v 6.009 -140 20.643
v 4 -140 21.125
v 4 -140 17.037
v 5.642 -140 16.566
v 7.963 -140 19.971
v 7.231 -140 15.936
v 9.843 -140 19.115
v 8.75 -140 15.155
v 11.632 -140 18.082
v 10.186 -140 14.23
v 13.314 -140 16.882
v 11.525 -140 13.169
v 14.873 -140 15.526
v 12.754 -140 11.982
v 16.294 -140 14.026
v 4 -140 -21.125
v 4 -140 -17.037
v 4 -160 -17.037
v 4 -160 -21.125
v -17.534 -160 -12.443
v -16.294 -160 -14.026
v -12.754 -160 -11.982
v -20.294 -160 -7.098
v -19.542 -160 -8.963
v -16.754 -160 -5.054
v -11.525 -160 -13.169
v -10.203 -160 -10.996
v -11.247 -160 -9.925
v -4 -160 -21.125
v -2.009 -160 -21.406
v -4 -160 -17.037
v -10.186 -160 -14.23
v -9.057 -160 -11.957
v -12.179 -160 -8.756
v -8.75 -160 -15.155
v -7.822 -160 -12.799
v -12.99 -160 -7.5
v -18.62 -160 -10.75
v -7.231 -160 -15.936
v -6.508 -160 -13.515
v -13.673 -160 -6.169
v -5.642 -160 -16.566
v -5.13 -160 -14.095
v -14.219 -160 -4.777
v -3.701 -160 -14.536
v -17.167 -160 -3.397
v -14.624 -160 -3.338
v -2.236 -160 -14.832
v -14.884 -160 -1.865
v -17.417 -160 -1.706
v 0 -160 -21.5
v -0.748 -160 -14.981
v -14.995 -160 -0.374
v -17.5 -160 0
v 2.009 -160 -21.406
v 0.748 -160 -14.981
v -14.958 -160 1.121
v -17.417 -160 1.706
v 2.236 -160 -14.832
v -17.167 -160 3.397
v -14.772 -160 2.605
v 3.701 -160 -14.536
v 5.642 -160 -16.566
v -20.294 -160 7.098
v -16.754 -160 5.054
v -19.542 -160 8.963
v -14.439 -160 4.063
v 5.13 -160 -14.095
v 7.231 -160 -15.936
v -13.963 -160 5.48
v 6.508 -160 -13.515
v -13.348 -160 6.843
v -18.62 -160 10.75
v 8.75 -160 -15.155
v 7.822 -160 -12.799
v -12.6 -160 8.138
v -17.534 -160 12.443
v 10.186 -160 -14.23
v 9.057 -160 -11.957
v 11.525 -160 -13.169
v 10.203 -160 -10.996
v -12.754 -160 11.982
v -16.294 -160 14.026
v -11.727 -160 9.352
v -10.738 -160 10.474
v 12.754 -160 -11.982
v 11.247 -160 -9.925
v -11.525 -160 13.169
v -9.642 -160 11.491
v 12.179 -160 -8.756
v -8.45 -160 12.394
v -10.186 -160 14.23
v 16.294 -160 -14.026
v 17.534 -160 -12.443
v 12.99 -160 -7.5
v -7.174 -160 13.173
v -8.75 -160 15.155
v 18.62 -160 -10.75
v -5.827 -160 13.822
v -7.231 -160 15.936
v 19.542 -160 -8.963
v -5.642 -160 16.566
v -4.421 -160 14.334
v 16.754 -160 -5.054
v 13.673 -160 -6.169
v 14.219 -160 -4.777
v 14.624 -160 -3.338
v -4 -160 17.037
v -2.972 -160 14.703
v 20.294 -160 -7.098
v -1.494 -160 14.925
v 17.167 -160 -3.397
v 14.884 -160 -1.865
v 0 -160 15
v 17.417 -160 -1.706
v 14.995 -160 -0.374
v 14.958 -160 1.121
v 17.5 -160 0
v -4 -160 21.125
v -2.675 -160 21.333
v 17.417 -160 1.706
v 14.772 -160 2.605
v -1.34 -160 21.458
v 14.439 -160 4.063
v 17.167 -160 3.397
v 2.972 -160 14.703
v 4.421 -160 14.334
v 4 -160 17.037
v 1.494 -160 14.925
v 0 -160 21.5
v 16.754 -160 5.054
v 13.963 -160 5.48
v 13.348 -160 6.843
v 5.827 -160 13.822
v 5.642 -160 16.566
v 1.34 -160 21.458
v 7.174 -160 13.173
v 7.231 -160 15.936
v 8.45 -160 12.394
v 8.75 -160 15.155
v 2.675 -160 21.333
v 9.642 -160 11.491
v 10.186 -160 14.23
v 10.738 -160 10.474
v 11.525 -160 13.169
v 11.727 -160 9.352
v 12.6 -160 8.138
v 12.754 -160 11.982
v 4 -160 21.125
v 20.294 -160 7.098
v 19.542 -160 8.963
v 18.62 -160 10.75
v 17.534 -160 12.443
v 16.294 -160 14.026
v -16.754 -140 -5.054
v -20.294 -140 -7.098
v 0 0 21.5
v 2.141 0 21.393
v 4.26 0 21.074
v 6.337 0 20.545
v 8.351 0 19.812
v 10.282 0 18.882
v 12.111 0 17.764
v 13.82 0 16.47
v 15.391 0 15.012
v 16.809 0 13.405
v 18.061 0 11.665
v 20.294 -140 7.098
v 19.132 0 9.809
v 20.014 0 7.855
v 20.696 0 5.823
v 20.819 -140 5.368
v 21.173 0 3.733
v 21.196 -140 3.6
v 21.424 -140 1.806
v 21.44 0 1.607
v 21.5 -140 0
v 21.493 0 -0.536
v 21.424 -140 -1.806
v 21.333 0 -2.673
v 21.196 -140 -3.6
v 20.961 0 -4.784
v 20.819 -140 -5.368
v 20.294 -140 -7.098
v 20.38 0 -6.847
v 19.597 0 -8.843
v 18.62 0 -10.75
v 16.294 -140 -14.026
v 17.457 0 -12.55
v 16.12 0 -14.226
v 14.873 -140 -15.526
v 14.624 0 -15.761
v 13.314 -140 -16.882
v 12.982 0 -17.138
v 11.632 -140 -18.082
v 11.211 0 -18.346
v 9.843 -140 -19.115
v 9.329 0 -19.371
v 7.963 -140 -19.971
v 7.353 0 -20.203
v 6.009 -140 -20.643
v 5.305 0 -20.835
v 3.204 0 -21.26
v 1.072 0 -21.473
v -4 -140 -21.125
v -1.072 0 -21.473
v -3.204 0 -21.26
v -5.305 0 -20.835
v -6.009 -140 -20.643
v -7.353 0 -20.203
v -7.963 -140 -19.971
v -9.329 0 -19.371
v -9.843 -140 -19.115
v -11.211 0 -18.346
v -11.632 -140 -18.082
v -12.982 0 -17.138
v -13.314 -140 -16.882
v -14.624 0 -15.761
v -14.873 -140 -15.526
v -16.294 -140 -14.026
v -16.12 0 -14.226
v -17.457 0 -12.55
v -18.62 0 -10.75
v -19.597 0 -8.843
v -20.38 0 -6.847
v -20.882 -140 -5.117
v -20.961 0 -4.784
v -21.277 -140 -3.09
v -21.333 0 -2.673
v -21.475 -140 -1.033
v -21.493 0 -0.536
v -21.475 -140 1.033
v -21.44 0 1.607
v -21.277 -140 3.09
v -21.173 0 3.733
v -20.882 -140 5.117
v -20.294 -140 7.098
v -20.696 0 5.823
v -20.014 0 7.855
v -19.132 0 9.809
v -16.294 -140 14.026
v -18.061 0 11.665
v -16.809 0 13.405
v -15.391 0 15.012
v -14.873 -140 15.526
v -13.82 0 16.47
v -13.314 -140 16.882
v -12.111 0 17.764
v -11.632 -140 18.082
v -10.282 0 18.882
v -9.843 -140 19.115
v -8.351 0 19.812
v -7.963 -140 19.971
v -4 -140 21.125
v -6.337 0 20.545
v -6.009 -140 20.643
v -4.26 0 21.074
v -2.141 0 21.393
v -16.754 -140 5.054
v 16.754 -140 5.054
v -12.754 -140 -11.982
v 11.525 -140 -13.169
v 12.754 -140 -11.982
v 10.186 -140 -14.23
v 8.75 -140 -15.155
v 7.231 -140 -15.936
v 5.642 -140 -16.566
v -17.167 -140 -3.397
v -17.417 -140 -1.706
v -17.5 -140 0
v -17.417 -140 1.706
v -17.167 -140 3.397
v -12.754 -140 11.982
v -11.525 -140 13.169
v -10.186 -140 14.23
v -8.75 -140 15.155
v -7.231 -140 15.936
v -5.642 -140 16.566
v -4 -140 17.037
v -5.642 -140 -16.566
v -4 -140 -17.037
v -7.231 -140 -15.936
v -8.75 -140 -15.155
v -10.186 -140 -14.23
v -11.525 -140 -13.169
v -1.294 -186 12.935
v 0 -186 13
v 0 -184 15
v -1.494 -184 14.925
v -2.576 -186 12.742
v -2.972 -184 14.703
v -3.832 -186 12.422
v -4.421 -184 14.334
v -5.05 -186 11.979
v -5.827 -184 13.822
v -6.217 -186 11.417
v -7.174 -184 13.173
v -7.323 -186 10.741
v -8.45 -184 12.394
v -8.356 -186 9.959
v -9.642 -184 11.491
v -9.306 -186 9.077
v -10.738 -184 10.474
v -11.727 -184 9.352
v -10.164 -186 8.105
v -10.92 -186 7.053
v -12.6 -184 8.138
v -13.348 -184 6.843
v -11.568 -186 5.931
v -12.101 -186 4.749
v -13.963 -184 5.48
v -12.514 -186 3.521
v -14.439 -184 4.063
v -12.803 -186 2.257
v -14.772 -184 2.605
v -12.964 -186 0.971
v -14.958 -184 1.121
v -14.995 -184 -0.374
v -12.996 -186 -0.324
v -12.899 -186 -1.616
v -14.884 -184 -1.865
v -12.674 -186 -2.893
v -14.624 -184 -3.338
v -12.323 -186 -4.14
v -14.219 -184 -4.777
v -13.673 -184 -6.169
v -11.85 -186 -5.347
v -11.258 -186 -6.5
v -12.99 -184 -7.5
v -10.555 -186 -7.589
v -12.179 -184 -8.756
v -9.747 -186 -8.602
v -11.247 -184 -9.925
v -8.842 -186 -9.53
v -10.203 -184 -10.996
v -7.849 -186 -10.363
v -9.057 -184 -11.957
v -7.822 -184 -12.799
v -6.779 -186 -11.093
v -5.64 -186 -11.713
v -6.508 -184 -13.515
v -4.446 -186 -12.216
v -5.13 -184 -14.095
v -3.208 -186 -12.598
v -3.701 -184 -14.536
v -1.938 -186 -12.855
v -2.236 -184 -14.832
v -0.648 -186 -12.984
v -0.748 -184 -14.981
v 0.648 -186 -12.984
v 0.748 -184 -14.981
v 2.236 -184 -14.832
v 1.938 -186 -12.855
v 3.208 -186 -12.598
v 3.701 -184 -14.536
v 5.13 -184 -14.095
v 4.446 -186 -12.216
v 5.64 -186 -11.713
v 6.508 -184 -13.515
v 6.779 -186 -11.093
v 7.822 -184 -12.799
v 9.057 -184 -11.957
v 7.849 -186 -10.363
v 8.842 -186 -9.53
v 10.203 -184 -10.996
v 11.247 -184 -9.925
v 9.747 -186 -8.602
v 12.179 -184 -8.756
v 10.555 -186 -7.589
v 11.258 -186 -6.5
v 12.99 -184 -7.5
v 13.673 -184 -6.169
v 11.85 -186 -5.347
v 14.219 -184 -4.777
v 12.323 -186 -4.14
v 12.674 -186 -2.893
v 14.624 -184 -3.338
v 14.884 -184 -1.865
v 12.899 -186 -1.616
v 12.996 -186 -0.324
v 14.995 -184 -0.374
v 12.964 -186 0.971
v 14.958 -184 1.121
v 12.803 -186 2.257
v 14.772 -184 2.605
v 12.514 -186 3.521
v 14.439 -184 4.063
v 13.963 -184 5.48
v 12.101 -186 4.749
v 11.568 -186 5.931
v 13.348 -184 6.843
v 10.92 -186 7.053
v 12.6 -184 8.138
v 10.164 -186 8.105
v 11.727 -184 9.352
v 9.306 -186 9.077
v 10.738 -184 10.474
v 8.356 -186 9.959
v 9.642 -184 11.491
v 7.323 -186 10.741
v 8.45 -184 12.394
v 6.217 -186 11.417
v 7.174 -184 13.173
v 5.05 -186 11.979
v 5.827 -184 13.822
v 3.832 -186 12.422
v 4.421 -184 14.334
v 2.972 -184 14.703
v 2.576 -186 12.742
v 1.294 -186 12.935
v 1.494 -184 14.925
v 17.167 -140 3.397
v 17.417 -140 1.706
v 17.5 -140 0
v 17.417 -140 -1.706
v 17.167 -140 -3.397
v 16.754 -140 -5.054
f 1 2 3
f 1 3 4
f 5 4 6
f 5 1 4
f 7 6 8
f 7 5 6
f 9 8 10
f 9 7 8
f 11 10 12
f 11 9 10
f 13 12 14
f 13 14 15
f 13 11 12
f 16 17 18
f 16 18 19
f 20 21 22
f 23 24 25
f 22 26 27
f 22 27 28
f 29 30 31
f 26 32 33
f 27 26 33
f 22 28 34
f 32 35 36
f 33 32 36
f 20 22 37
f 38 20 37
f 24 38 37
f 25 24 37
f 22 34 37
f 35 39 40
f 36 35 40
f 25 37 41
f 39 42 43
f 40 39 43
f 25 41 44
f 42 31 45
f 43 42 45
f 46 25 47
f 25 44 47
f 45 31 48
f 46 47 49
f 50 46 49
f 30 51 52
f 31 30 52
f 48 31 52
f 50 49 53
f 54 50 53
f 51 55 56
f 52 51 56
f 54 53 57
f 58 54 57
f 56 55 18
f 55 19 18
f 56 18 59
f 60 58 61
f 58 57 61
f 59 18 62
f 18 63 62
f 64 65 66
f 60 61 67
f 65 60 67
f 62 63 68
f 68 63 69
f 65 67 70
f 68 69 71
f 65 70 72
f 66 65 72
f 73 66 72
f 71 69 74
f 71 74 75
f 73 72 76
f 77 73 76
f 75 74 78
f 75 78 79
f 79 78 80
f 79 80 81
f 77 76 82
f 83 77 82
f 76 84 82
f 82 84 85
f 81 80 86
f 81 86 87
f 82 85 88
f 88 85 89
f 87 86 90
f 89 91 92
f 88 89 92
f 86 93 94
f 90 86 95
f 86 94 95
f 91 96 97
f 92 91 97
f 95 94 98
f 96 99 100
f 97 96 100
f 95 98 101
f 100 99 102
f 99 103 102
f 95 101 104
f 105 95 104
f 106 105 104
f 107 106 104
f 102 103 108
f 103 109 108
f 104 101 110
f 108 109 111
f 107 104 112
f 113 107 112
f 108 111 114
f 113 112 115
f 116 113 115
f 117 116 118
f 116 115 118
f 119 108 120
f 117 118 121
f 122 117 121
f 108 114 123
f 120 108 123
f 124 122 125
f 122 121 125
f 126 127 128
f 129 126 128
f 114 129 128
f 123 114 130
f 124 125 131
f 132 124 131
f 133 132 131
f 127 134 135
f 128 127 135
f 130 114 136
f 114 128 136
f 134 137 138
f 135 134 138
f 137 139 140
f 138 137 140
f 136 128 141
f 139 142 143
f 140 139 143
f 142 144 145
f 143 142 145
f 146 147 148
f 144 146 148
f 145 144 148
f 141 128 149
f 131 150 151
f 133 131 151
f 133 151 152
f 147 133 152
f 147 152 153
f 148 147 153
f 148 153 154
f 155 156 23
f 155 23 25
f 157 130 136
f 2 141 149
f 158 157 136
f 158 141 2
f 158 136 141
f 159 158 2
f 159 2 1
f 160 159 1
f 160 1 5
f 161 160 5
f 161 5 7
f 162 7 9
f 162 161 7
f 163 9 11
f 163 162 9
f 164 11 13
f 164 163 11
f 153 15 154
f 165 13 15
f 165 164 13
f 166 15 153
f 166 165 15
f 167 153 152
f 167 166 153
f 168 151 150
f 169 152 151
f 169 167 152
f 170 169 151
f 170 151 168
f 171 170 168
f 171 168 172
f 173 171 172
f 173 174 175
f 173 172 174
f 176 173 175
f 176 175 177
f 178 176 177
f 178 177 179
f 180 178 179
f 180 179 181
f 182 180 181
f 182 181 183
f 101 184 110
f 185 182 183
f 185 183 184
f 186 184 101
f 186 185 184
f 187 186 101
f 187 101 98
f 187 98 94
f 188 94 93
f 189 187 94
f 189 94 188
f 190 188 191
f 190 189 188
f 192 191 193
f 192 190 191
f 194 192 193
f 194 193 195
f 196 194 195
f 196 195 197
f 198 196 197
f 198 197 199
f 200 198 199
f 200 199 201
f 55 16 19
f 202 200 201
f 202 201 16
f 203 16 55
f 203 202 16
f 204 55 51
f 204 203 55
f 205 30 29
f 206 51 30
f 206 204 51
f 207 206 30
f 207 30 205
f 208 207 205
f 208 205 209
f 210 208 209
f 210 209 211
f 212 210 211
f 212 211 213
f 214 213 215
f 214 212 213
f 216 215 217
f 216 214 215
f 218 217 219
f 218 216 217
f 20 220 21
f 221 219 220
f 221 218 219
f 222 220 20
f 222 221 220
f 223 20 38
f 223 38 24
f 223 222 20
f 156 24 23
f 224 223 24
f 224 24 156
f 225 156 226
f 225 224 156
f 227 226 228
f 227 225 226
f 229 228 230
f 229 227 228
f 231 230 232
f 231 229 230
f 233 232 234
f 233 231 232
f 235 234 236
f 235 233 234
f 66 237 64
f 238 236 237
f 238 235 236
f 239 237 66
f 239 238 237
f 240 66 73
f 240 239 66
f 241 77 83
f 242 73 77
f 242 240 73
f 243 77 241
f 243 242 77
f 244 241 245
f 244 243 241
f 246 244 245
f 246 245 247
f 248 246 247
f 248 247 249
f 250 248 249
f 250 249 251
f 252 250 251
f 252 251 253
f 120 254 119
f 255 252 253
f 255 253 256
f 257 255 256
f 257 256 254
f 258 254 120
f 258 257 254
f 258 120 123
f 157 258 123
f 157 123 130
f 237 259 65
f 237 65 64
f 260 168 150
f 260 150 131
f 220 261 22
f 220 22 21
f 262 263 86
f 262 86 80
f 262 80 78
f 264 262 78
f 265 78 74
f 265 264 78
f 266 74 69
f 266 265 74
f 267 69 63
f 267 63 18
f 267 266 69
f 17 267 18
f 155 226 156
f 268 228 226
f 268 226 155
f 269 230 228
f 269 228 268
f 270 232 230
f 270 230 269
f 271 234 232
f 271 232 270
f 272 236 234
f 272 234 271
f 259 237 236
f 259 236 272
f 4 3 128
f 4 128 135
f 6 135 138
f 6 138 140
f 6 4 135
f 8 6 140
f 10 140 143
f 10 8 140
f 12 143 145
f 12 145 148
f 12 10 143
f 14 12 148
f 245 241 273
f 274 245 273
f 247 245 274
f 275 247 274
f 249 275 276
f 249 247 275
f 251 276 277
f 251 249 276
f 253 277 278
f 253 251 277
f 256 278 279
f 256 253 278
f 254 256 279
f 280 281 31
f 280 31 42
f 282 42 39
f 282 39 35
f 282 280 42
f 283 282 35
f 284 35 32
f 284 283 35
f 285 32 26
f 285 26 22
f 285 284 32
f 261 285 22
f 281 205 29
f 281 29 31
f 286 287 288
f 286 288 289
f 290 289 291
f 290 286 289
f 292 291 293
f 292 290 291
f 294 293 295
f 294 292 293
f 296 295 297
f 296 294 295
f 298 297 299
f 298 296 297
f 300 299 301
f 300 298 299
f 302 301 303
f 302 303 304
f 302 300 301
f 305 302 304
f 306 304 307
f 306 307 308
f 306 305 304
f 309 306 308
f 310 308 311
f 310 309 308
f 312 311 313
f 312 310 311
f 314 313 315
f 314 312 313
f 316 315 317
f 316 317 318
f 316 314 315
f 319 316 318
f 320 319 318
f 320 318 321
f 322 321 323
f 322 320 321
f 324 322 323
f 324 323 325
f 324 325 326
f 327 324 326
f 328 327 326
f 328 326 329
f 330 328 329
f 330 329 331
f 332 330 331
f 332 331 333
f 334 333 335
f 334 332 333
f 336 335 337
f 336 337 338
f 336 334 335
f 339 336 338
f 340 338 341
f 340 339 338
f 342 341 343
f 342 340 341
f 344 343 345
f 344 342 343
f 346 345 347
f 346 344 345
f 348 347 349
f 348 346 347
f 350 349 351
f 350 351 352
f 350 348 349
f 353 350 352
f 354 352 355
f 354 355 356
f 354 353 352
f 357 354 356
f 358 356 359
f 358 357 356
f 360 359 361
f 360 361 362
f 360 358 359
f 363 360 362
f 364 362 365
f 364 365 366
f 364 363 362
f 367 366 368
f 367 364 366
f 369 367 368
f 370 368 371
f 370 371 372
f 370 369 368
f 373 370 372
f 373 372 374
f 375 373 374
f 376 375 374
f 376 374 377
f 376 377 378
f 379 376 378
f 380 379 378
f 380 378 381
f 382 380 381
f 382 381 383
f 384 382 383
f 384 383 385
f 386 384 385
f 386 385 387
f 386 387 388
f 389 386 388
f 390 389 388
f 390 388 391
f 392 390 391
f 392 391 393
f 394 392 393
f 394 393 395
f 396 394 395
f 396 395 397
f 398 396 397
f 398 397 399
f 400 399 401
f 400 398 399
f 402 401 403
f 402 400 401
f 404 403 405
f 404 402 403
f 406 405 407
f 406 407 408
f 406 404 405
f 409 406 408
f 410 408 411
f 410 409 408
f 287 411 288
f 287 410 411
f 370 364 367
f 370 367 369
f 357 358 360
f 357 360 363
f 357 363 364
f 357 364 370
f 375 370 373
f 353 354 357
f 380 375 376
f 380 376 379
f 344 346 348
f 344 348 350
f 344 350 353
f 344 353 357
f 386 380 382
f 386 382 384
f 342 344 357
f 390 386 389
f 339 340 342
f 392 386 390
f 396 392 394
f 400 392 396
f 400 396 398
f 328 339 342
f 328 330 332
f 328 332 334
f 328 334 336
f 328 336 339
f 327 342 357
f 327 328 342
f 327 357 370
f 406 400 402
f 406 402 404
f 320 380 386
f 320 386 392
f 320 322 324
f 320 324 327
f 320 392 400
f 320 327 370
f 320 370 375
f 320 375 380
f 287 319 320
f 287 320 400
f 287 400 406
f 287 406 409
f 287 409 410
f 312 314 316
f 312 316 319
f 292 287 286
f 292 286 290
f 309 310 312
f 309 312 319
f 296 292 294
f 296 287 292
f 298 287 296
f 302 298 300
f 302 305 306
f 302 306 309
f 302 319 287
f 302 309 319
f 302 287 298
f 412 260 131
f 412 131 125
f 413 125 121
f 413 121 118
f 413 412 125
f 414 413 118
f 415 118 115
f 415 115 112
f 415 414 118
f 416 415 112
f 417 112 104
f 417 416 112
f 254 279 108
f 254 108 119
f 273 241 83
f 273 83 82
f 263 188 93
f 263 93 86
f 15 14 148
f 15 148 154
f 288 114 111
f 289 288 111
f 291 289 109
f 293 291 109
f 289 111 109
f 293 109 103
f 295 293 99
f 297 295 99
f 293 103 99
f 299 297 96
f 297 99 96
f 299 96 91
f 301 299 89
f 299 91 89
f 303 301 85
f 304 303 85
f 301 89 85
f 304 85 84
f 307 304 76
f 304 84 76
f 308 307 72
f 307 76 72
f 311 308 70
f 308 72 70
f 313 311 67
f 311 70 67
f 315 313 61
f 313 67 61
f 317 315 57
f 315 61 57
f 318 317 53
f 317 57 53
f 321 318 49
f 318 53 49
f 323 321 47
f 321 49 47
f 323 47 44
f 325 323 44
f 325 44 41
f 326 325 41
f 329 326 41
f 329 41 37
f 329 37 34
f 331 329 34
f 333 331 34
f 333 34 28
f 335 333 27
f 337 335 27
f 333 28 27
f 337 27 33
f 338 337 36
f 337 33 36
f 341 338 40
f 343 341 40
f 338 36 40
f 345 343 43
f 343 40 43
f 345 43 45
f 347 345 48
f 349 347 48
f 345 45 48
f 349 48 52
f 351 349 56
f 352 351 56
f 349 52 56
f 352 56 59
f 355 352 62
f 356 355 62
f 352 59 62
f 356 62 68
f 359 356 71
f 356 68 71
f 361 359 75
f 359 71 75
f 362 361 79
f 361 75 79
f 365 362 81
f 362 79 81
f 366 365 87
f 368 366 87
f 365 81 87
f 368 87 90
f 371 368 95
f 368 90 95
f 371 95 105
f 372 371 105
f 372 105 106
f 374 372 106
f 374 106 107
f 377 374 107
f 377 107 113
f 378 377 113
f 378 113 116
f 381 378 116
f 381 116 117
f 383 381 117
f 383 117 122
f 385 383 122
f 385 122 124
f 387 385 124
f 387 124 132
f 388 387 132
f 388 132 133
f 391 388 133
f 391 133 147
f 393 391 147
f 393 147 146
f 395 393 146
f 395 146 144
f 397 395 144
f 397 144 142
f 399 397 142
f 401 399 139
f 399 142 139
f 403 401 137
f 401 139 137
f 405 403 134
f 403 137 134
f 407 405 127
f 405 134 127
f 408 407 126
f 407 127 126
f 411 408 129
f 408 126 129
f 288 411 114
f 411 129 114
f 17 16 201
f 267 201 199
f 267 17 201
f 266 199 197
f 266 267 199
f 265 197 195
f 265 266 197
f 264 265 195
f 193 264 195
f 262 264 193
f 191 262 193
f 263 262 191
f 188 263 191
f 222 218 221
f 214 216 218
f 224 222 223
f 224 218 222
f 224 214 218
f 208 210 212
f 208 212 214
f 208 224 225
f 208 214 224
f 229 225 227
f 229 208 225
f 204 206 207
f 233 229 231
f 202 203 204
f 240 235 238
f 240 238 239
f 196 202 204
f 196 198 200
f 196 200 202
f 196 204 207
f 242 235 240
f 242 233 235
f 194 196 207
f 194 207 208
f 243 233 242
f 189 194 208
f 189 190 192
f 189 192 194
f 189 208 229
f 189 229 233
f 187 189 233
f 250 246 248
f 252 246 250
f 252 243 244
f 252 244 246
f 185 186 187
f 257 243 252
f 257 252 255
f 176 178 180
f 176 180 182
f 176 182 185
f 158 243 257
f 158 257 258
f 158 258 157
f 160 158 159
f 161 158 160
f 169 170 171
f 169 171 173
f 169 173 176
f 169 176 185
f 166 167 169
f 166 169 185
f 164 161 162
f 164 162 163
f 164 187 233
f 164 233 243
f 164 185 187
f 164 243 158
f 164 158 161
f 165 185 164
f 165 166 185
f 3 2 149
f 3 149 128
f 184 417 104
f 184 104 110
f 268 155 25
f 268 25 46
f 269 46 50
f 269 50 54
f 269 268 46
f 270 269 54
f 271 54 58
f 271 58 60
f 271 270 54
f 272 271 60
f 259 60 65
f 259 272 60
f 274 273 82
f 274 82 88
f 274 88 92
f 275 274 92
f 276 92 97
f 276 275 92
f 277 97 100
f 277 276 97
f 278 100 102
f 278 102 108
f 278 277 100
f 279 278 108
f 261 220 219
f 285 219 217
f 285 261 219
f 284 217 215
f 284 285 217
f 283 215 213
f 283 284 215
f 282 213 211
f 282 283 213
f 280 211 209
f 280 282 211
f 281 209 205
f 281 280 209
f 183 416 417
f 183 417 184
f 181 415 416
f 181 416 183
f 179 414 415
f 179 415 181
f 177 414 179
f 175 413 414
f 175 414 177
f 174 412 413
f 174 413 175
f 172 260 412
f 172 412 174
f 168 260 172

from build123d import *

# Parameters (mm, degrees)
SKETCH1_R           = 21.5
BOSS_EXTRUDE1_DEPTH = 160
CUT_EXTRUDE1_START  = -20
CUT_EXTRUDE1_DEPTH  = 20
SKETCH4_R           = 15
BOSS_EXTRUDE2_DEPTH = 26
CHAMFER1_SIZE       = 2


with BuildPart() as part:
    # Sketch1 → Boss-Extrude1 (new body)
    with BuildSketch(Plane(origin=(0, 0, 0), x_dir=(1, 0, 0), z_dir=(0, 1, 0))):
        with Locations(Location((0, 0, 0), (0, 0, 270))):
            Circle(SKETCH1_R)
    extrude(amount=-BOSS_EXTRUDE1_DEPTH)

    # Sketch3 → Cut-Extrude1 (cut)
    with BuildSketch(Plane.XZ.offset(160).offset(CUT_EXTRUDE1_START)):
        with BuildLine():
            Line((-4, 17.036725037), (-4, 21.124630174))
            ThreePointArc((-4, 21.124630174), (-10.75, 18.619546181), (-16.294466376, 14.026416702))
            Line((-16.294466376, 14.026416702), (-12.75423668, 11.982464134))
            ThreePointArc((-12.75423668, 11.982464134), (-8.75, 15.155444566), (-4, 17.036725037))
        make_face()
        with BuildLine():
            ThreePointArc((16.294466376, 14.026416702), (10.75, 18.619546181), (4, 21.124630174))
            Line((4, 21.124630174), (4, 17.036725037))
            ThreePointArc((4, 17.036725037), (8.75, 15.155444566), (12.75423668, 11.982464134))
            Line((12.75423668, 11.982464134), (16.294466376, 14.026416702))
        make_face()
        with BuildLine():
            ThreePointArc((21.5, 0), (21.196474083, 3.599928673), (20.294466376, 7.098213472))
            Line((20.294466376, 7.098213472), (16.75423668, 5.054260904))
            ThreePointArc((16.75423668, 5.054260904), (17.5, 0), (16.75423668, -5.054260904))
            Line((16.75423668, -5.054260904), (20.294466376, -7.098213472))
            ThreePointArc((20.294466376, -7.098213472), (21.196474083, -3.599928673), (21.5, 0))
        make_face()
        with BuildLine():
            Line((-16.75423668, 5.054260904), (-20.294466376, 7.098213472))
            ThreePointArc((-20.294466376, 7.098213472), (-21.5, 0), (-20.294466376, -7.098213472))
            Line((-20.294466376, -7.098213472), (-16.75423668, -5.054260904))
            ThreePointArc((-16.75423668, -5.054260904), (-17.5, 0), (-16.75423668, 5.054260904))
        make_face()
        with BuildLine():
            Line((-12.75423668, -11.982464134), (-16.294466376, -14.026416702))
            ThreePointArc((-16.294466376, -14.026416702), (-10.75, -18.619546181), (-4, -21.124630174))
            Line((-4, -21.124630174), (-4, -17.036725037))
            ThreePointArc((-4, -17.036725037), (-8.75, -15.155444566), (-12.75423668, -11.982464134))
        make_face()
        with BuildLine():
            Line((4, -17.036725037), (4, -21.124630174))
            ThreePointArc((4, -21.124630174), (10.75, -18.619546181), (16.294466376, -14.026416702))
            Line((16.294466376, -14.026416702), (12.75423668, -11.982464134))
            ThreePointArc((12.75423668, -11.982464134), (8.75, -15.155444566), (4, -17.036725037))
        make_face()
    extrude(amount=CUT_EXTRUDE1_DEPTH, mode=Mode.SUBTRACT)

    # Sketch4 → Boss-Extrude2 (add)
    with BuildSketch(Plane.XZ.offset(160)):
        with Locations(Location((0, 0, 0), (0, 0, 90))):
            Circle(SKETCH4_R)
    extrude(amount=BOSS_EXTRUDE2_DEPTH)

    # Chamfer1
    chamfer1_edges = [part.edges().sort_by_distance(p)[0] for p in [
        (0, -186, -15),
    ]]
    chamfer(chamfer1_edges, length=CHAMFER1_SIZE)


solid = part.part
